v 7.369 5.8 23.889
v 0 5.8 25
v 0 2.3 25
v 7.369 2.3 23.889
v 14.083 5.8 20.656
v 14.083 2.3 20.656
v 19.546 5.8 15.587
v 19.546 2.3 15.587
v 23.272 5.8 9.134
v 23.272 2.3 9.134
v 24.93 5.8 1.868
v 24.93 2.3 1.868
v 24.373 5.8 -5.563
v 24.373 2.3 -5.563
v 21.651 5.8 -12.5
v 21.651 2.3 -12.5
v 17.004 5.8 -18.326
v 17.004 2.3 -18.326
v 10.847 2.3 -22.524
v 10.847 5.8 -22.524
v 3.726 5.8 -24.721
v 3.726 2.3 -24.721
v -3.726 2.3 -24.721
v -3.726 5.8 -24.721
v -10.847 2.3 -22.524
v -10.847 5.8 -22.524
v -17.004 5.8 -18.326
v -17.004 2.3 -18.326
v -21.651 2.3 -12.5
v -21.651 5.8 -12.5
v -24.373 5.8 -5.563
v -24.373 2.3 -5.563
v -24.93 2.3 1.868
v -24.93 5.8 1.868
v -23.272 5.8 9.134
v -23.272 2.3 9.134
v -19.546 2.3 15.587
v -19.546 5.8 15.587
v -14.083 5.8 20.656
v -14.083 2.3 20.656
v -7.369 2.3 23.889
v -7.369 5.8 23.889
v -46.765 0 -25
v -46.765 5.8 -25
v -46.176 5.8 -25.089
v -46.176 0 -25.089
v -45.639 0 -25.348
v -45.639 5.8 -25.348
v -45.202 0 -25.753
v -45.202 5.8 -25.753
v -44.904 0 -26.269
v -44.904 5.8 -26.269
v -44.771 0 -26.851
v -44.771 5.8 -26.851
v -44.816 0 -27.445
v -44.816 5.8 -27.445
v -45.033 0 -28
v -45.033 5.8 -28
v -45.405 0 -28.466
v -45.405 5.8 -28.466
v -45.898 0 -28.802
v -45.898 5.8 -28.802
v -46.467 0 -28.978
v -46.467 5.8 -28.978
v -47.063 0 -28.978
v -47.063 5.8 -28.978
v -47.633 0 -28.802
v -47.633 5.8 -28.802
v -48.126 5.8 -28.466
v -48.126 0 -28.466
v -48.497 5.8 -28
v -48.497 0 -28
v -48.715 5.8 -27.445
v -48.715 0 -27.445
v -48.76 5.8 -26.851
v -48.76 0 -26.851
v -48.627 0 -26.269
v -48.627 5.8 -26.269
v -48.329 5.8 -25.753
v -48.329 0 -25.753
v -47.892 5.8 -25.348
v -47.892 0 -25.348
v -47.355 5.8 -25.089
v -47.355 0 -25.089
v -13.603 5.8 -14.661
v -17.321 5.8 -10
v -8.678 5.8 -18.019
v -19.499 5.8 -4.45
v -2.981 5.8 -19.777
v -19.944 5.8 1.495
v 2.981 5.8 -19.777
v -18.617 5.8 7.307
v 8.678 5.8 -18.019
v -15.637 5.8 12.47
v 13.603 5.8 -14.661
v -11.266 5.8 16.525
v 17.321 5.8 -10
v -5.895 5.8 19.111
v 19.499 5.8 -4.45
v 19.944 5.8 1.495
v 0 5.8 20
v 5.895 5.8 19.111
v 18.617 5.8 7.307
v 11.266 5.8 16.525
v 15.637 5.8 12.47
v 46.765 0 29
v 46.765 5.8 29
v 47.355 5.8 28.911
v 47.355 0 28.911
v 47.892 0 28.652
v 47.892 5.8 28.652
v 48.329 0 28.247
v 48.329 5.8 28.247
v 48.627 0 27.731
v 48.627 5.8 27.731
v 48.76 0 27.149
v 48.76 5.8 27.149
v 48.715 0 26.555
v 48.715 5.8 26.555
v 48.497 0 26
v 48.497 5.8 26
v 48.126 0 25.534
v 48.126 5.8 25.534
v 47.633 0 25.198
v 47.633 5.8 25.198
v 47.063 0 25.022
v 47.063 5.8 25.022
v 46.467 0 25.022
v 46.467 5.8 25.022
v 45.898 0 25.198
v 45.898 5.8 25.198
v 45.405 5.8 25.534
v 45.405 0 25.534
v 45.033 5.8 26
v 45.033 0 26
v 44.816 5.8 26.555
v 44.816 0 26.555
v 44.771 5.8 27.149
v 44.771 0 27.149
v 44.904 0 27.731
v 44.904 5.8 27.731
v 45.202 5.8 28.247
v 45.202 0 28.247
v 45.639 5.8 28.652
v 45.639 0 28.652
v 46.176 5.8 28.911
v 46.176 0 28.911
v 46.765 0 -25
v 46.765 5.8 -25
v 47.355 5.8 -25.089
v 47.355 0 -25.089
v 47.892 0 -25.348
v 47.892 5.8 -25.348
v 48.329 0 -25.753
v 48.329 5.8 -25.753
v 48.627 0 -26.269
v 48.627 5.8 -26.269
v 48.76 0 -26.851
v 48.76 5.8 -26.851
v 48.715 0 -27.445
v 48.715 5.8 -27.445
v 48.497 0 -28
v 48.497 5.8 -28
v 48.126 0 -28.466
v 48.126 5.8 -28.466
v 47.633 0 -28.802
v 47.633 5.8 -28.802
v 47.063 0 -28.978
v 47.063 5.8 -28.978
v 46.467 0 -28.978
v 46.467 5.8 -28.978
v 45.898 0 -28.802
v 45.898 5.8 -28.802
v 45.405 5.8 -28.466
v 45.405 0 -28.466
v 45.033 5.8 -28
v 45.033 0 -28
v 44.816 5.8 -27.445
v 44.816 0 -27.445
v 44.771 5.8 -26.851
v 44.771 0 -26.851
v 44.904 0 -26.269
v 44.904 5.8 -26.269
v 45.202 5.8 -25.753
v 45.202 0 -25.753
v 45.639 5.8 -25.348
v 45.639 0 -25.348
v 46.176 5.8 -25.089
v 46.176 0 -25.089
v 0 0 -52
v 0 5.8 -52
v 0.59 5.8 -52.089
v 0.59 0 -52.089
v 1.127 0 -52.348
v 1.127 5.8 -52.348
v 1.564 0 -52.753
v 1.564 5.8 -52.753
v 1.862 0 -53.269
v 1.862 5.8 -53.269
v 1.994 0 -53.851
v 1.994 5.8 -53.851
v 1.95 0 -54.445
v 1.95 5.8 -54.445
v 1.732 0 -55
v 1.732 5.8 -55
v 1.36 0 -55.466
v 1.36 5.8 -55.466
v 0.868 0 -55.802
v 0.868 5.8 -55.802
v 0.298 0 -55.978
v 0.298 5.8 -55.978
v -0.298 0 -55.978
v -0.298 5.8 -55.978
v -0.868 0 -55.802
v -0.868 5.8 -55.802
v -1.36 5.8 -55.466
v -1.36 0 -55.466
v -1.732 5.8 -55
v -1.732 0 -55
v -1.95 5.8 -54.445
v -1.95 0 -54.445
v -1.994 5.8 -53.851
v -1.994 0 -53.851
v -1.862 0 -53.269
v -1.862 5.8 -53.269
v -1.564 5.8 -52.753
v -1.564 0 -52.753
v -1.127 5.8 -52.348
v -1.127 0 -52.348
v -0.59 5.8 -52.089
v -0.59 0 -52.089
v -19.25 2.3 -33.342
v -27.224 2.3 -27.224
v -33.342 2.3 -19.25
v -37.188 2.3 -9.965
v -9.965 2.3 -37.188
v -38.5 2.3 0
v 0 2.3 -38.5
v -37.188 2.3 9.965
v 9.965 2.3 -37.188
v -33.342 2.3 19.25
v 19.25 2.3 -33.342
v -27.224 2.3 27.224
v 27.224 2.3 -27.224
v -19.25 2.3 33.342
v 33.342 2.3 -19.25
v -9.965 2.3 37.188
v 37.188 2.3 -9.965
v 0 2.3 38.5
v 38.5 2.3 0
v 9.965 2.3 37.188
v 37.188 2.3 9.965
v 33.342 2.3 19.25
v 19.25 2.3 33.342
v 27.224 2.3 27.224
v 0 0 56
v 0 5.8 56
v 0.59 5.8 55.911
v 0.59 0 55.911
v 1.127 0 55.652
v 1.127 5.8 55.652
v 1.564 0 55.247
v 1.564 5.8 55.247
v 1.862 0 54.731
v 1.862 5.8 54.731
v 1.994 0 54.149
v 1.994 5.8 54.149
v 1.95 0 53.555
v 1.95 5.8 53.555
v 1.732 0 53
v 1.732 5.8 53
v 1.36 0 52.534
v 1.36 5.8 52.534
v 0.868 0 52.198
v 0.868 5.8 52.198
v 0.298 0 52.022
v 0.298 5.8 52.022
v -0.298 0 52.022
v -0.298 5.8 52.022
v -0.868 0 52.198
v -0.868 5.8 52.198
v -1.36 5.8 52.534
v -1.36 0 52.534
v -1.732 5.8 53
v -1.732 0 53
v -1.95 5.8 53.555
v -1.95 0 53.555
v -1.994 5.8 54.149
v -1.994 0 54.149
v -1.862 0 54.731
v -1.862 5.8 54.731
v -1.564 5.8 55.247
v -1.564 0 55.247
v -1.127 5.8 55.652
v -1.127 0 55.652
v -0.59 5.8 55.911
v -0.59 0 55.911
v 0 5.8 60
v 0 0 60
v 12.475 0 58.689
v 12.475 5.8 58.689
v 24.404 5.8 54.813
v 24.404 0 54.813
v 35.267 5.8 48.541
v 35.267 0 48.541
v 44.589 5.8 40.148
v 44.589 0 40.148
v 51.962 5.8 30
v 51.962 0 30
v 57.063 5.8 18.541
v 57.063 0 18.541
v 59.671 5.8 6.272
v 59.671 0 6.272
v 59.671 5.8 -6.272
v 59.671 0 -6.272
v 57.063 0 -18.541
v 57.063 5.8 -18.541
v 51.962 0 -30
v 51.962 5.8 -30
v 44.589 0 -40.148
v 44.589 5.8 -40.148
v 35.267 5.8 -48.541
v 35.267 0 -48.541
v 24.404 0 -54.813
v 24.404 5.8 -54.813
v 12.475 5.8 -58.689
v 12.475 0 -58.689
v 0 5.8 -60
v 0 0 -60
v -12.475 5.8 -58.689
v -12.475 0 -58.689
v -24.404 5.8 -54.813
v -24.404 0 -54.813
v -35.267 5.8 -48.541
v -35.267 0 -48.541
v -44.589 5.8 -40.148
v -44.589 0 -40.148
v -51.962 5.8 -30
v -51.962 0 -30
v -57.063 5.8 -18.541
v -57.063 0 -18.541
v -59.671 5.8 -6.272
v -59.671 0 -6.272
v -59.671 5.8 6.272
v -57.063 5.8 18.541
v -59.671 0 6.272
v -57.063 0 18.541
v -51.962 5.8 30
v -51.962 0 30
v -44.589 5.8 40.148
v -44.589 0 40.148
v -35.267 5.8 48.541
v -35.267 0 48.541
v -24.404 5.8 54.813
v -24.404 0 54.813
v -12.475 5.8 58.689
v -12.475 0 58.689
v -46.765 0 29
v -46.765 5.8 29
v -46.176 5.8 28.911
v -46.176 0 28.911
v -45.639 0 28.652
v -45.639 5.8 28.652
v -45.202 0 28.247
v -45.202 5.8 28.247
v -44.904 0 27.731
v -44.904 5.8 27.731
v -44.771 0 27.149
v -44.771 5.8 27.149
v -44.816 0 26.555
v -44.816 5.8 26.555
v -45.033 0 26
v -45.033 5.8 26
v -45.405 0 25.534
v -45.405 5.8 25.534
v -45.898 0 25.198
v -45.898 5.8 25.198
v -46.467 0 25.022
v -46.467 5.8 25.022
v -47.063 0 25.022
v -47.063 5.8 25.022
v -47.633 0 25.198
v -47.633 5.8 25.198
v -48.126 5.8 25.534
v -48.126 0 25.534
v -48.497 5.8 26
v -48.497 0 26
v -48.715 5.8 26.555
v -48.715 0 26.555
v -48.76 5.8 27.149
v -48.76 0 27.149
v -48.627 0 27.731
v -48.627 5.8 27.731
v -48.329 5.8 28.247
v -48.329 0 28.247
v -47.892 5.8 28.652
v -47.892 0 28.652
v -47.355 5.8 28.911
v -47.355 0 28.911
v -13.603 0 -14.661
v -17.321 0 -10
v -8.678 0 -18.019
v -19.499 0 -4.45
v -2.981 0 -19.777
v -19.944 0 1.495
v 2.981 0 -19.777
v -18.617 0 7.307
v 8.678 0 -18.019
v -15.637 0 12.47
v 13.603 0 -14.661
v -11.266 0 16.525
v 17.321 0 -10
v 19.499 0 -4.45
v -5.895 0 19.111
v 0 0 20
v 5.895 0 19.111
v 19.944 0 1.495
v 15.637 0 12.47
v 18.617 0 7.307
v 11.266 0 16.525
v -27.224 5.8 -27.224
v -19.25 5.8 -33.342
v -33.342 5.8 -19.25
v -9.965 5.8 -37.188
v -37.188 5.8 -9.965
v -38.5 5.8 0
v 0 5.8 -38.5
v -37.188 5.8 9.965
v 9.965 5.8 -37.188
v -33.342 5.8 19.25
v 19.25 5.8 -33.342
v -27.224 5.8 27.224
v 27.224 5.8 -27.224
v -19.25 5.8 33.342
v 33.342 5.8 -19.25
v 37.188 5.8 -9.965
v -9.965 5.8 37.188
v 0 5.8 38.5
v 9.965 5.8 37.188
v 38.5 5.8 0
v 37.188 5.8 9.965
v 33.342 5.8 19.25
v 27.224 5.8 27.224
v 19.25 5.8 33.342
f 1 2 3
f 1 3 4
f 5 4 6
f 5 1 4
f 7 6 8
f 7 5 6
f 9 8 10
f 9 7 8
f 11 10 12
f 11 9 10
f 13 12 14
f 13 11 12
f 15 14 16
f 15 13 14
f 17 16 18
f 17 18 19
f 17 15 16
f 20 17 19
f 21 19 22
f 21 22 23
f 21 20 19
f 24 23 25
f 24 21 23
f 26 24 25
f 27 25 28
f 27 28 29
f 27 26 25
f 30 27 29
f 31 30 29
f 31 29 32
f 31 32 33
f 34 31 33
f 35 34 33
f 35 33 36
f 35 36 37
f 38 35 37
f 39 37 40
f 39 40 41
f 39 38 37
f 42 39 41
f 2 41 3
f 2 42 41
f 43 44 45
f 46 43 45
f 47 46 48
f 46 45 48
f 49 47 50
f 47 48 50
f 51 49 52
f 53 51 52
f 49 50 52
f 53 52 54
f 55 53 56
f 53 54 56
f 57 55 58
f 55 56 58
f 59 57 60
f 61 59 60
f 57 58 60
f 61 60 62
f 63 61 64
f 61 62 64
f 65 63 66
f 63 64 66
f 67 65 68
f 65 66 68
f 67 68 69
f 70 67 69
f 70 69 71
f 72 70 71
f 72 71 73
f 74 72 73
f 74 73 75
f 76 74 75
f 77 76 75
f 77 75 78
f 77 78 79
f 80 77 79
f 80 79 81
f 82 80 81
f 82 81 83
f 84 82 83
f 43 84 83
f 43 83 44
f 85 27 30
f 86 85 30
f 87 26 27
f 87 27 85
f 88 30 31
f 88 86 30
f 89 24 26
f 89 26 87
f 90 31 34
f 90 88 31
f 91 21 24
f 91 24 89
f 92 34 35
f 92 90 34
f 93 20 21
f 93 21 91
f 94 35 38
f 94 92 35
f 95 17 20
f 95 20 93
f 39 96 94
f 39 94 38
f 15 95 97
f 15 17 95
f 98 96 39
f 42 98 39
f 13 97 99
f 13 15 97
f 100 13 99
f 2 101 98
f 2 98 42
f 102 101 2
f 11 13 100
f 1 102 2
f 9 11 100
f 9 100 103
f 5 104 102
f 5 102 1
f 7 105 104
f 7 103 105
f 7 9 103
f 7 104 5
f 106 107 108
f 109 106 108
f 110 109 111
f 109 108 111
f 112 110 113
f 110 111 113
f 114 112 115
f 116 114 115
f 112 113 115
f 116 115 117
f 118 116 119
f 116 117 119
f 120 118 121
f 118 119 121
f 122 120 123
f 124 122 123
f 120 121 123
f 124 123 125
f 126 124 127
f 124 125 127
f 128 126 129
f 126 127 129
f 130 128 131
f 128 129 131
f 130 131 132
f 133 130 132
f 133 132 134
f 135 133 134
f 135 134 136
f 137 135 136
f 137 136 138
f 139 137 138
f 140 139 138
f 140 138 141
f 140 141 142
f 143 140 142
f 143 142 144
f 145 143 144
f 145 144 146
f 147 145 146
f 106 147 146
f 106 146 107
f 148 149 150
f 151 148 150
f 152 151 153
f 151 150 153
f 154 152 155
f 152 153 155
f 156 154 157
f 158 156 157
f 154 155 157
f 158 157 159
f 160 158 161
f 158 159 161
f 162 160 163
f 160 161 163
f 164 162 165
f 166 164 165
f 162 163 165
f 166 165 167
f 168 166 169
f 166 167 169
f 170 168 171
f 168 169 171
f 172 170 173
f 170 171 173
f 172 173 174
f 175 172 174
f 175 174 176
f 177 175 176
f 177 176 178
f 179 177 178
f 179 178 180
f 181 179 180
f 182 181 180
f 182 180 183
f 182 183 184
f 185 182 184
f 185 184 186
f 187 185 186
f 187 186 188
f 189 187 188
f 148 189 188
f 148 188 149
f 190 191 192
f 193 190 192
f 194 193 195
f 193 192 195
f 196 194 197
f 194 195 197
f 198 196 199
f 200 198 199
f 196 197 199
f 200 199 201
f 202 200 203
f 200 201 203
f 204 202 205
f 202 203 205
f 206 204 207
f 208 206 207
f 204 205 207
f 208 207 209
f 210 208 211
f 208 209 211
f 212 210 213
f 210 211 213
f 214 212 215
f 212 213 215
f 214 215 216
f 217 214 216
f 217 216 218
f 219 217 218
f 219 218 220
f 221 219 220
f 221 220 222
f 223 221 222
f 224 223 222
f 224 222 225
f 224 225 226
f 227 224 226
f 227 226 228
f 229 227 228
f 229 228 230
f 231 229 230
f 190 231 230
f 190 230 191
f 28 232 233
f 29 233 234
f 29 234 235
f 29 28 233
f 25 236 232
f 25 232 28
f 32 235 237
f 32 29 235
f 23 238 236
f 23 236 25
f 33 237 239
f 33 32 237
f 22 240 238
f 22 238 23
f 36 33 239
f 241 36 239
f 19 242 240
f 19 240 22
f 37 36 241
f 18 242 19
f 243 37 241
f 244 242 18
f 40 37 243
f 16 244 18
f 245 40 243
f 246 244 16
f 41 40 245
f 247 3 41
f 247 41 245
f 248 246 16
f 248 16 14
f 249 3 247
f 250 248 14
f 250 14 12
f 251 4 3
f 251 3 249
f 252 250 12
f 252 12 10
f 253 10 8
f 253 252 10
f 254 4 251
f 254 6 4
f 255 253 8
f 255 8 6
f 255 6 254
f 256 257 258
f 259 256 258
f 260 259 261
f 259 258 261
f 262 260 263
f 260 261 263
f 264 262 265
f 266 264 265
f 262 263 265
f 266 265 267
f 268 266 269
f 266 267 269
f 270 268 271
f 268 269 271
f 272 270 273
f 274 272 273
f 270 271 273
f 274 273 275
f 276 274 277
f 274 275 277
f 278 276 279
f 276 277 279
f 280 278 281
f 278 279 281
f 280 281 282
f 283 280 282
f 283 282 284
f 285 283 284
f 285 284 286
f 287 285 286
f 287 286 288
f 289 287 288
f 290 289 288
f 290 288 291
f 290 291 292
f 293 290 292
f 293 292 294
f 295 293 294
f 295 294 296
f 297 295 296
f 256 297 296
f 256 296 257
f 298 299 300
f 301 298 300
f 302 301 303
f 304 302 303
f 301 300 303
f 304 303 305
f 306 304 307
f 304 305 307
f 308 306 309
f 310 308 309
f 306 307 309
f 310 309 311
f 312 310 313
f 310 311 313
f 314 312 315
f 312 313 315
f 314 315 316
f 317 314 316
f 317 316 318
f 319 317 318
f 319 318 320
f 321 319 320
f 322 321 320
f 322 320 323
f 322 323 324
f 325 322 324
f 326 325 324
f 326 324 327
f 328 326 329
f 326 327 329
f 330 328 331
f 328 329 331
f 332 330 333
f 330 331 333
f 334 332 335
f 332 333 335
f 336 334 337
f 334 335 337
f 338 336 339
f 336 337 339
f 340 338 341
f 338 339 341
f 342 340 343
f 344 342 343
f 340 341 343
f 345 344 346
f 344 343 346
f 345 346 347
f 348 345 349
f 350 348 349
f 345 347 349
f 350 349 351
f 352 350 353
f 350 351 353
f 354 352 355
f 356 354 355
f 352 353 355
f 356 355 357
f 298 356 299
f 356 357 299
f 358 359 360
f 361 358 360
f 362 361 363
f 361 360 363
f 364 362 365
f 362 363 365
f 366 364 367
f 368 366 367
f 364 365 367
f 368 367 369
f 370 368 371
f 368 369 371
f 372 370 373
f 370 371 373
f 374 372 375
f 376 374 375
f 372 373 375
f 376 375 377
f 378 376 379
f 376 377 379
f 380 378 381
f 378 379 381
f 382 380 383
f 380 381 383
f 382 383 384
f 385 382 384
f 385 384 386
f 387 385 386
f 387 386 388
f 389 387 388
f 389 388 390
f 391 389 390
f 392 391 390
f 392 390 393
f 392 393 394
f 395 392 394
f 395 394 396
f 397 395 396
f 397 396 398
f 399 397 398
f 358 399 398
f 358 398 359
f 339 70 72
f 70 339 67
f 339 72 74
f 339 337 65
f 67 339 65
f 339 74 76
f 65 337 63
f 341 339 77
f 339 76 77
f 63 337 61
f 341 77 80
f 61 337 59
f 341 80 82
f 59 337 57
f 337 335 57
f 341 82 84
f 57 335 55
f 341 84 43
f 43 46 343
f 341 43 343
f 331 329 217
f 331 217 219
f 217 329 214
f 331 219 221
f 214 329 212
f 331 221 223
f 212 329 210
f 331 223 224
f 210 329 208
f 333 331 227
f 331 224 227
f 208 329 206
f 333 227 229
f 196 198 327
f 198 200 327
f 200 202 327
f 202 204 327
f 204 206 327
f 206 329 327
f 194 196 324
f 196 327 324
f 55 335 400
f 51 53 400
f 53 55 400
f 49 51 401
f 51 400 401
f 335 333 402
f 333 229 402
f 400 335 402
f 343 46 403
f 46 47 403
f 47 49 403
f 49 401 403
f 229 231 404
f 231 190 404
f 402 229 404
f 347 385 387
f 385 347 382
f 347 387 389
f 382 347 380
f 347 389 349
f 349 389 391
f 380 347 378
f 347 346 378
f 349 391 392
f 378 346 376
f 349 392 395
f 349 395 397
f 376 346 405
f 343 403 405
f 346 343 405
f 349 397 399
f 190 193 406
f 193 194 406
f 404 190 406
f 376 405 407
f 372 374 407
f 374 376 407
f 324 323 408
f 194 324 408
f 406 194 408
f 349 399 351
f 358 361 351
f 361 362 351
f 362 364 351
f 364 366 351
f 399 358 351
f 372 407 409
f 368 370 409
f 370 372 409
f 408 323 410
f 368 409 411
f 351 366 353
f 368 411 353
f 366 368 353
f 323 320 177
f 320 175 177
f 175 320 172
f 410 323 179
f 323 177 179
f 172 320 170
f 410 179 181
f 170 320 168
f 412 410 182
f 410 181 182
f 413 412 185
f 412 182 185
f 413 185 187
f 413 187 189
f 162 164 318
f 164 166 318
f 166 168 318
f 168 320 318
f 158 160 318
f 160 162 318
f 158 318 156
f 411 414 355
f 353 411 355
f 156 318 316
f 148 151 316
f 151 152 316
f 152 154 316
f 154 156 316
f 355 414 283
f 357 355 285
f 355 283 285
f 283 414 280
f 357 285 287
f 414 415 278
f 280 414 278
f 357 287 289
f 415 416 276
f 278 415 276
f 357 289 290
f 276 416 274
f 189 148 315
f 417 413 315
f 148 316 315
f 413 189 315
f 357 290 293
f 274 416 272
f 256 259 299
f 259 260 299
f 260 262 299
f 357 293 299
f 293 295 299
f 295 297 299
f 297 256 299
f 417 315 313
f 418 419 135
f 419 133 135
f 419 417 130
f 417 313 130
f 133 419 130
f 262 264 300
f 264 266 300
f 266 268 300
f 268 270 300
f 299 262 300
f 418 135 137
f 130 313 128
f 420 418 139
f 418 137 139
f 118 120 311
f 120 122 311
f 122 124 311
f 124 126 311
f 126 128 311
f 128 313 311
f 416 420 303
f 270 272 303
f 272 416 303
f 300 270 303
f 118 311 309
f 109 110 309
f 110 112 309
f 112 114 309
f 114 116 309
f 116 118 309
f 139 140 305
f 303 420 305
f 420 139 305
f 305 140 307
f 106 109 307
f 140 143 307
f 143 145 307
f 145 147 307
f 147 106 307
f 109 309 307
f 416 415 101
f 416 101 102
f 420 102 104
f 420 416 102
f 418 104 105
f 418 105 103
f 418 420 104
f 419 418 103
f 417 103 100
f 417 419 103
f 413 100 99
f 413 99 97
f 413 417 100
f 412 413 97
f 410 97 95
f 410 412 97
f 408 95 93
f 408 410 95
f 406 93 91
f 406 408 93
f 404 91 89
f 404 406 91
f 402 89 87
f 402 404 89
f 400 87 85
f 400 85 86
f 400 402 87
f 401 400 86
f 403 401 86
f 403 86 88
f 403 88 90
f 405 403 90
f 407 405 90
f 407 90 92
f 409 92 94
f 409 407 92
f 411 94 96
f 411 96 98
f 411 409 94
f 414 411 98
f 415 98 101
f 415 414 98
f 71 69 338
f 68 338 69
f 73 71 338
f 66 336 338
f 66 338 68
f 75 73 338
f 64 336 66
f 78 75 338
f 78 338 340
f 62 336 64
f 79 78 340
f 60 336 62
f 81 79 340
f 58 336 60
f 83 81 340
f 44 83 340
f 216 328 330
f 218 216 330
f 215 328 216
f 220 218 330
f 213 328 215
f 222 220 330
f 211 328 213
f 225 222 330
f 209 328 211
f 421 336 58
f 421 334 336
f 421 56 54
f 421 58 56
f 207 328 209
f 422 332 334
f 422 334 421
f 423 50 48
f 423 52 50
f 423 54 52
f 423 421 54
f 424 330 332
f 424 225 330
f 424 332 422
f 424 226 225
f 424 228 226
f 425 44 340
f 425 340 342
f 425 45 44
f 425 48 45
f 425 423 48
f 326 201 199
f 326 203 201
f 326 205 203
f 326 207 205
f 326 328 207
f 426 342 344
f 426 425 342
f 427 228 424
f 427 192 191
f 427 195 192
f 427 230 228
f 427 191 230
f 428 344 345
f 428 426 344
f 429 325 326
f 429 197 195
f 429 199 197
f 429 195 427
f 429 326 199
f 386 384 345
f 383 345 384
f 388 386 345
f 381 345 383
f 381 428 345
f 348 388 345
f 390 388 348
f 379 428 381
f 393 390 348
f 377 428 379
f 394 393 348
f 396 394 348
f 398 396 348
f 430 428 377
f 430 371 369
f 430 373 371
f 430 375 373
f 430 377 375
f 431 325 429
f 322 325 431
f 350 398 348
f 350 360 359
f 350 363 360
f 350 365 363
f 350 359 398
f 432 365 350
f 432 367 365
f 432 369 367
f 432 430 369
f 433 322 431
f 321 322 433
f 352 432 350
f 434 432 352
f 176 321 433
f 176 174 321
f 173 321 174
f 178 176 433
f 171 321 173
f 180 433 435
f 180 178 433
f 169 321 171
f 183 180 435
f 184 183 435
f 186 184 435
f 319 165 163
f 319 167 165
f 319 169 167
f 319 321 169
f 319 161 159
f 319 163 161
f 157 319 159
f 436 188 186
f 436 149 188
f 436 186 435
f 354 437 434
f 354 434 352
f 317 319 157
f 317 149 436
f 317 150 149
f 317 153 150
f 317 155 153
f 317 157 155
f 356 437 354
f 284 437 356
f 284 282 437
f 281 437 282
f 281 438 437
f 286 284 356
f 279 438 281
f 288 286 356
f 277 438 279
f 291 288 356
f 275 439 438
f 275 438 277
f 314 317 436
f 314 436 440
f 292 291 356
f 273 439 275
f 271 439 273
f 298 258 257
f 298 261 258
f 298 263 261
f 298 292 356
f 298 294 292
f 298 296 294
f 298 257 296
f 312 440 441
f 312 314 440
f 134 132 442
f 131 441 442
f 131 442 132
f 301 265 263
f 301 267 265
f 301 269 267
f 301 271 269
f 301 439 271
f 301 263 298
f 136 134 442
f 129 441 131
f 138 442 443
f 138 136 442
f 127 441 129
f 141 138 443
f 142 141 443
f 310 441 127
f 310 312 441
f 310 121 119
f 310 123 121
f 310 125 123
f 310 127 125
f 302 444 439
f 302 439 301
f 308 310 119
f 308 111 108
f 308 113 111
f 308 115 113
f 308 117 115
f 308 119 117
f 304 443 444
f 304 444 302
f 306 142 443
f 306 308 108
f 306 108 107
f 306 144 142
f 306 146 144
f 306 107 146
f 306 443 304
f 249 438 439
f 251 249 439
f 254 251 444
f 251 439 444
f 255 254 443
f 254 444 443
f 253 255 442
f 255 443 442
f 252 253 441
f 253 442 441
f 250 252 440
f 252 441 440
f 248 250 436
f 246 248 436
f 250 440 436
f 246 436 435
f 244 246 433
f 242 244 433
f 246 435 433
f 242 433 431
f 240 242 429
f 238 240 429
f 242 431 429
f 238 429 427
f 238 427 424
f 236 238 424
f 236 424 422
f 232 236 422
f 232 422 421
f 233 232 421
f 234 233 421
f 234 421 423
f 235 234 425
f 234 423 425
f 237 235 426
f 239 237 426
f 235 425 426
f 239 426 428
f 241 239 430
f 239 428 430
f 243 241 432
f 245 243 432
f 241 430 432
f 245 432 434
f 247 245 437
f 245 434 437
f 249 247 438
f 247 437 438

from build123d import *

# Parameters (mm, degrees)
SKETCH1_R           = 60
SKETCH1_R_2         = 20
BOSS_EXTRUDE1_DEPTH = 5.8
SKETCH2_R           = 38.5
SKETCH2_R_2         = 25
CUT_EXTRUDE1_DEPTH  = 3.5
SKETCH3_R           = 2
CUT_EXTRUDE2_DEPTH  = 86.050808344


with BuildPart() as part:
    # Sketch1 → Boss-Extrude1 (new body)
    with BuildSketch(Plane(origin=(0, 0, 0), x_dir=(1, 0, 0), z_dir=(0, 1, 0))):
        with Locations(Location((0, 0, 0), (0, 0, 270))):
            Circle(SKETCH1_R)
        with Locations(Location((0, 0, 0), (0, 0, 270))):
            Circle(SKETCH1_R_2, mode=Mode.SUBTRACT)
    extrude(amount=BOSS_EXTRUDE1_DEPTH)

    # Sketch2 → Cut-Extrude1 (cut)
    with BuildSketch(Plane(origin=(0, 5.8, 0), x_dir=(1, 0, 0), z_dir=(0, 1, 0))):
        with Locations(Location((0, 0, 0), (0, 0, 270))):
            Circle(SKETCH2_R)
        with Locations(Location((0, 0, 0), (0, 0, 270))):
            Circle(SKETCH2_R_2, mode=Mode.SUBTRACT)
    extrude(amount=-CUT_EXTRUDE1_DEPTH, mode=Mode.SUBTRACT)

    # Sketch3 → Cut-Extrude2 (cut, through all)
    with BuildSketch(Plane(origin=(0, 5.8, 0), x_dir=(1, 0, 0), z_dir=(0, 1, 0))):
        with Locations(Location((0, 54, 0), (0, 0, 270))):
            Circle(SKETCH3_R)
        with Locations(Location((46.765371804, 27, 0), (0, 0, 270))):
            Circle(SKETCH3_R)
        with Locations(Location((46.765371804, -27, 0), (0, 0, 270))):
            Circle(SKETCH3_R)
        with Locations(Location((0, -54, 0), (0, 0, 270))):
            Circle(SKETCH3_R)
        with Locations(Location((-46.765371804, -27, 0), (0, 0, 270))):
            Circle(SKETCH3_R)
        with Locations(Location((-46.765371804, 27, 0), (0, 0, 270))):
            Circle(SKETCH3_R)
    extrude(amount=-CUT_EXTRUDE2_DEPTH, mode=Mode.SUBTRACT)


solid = part.part
